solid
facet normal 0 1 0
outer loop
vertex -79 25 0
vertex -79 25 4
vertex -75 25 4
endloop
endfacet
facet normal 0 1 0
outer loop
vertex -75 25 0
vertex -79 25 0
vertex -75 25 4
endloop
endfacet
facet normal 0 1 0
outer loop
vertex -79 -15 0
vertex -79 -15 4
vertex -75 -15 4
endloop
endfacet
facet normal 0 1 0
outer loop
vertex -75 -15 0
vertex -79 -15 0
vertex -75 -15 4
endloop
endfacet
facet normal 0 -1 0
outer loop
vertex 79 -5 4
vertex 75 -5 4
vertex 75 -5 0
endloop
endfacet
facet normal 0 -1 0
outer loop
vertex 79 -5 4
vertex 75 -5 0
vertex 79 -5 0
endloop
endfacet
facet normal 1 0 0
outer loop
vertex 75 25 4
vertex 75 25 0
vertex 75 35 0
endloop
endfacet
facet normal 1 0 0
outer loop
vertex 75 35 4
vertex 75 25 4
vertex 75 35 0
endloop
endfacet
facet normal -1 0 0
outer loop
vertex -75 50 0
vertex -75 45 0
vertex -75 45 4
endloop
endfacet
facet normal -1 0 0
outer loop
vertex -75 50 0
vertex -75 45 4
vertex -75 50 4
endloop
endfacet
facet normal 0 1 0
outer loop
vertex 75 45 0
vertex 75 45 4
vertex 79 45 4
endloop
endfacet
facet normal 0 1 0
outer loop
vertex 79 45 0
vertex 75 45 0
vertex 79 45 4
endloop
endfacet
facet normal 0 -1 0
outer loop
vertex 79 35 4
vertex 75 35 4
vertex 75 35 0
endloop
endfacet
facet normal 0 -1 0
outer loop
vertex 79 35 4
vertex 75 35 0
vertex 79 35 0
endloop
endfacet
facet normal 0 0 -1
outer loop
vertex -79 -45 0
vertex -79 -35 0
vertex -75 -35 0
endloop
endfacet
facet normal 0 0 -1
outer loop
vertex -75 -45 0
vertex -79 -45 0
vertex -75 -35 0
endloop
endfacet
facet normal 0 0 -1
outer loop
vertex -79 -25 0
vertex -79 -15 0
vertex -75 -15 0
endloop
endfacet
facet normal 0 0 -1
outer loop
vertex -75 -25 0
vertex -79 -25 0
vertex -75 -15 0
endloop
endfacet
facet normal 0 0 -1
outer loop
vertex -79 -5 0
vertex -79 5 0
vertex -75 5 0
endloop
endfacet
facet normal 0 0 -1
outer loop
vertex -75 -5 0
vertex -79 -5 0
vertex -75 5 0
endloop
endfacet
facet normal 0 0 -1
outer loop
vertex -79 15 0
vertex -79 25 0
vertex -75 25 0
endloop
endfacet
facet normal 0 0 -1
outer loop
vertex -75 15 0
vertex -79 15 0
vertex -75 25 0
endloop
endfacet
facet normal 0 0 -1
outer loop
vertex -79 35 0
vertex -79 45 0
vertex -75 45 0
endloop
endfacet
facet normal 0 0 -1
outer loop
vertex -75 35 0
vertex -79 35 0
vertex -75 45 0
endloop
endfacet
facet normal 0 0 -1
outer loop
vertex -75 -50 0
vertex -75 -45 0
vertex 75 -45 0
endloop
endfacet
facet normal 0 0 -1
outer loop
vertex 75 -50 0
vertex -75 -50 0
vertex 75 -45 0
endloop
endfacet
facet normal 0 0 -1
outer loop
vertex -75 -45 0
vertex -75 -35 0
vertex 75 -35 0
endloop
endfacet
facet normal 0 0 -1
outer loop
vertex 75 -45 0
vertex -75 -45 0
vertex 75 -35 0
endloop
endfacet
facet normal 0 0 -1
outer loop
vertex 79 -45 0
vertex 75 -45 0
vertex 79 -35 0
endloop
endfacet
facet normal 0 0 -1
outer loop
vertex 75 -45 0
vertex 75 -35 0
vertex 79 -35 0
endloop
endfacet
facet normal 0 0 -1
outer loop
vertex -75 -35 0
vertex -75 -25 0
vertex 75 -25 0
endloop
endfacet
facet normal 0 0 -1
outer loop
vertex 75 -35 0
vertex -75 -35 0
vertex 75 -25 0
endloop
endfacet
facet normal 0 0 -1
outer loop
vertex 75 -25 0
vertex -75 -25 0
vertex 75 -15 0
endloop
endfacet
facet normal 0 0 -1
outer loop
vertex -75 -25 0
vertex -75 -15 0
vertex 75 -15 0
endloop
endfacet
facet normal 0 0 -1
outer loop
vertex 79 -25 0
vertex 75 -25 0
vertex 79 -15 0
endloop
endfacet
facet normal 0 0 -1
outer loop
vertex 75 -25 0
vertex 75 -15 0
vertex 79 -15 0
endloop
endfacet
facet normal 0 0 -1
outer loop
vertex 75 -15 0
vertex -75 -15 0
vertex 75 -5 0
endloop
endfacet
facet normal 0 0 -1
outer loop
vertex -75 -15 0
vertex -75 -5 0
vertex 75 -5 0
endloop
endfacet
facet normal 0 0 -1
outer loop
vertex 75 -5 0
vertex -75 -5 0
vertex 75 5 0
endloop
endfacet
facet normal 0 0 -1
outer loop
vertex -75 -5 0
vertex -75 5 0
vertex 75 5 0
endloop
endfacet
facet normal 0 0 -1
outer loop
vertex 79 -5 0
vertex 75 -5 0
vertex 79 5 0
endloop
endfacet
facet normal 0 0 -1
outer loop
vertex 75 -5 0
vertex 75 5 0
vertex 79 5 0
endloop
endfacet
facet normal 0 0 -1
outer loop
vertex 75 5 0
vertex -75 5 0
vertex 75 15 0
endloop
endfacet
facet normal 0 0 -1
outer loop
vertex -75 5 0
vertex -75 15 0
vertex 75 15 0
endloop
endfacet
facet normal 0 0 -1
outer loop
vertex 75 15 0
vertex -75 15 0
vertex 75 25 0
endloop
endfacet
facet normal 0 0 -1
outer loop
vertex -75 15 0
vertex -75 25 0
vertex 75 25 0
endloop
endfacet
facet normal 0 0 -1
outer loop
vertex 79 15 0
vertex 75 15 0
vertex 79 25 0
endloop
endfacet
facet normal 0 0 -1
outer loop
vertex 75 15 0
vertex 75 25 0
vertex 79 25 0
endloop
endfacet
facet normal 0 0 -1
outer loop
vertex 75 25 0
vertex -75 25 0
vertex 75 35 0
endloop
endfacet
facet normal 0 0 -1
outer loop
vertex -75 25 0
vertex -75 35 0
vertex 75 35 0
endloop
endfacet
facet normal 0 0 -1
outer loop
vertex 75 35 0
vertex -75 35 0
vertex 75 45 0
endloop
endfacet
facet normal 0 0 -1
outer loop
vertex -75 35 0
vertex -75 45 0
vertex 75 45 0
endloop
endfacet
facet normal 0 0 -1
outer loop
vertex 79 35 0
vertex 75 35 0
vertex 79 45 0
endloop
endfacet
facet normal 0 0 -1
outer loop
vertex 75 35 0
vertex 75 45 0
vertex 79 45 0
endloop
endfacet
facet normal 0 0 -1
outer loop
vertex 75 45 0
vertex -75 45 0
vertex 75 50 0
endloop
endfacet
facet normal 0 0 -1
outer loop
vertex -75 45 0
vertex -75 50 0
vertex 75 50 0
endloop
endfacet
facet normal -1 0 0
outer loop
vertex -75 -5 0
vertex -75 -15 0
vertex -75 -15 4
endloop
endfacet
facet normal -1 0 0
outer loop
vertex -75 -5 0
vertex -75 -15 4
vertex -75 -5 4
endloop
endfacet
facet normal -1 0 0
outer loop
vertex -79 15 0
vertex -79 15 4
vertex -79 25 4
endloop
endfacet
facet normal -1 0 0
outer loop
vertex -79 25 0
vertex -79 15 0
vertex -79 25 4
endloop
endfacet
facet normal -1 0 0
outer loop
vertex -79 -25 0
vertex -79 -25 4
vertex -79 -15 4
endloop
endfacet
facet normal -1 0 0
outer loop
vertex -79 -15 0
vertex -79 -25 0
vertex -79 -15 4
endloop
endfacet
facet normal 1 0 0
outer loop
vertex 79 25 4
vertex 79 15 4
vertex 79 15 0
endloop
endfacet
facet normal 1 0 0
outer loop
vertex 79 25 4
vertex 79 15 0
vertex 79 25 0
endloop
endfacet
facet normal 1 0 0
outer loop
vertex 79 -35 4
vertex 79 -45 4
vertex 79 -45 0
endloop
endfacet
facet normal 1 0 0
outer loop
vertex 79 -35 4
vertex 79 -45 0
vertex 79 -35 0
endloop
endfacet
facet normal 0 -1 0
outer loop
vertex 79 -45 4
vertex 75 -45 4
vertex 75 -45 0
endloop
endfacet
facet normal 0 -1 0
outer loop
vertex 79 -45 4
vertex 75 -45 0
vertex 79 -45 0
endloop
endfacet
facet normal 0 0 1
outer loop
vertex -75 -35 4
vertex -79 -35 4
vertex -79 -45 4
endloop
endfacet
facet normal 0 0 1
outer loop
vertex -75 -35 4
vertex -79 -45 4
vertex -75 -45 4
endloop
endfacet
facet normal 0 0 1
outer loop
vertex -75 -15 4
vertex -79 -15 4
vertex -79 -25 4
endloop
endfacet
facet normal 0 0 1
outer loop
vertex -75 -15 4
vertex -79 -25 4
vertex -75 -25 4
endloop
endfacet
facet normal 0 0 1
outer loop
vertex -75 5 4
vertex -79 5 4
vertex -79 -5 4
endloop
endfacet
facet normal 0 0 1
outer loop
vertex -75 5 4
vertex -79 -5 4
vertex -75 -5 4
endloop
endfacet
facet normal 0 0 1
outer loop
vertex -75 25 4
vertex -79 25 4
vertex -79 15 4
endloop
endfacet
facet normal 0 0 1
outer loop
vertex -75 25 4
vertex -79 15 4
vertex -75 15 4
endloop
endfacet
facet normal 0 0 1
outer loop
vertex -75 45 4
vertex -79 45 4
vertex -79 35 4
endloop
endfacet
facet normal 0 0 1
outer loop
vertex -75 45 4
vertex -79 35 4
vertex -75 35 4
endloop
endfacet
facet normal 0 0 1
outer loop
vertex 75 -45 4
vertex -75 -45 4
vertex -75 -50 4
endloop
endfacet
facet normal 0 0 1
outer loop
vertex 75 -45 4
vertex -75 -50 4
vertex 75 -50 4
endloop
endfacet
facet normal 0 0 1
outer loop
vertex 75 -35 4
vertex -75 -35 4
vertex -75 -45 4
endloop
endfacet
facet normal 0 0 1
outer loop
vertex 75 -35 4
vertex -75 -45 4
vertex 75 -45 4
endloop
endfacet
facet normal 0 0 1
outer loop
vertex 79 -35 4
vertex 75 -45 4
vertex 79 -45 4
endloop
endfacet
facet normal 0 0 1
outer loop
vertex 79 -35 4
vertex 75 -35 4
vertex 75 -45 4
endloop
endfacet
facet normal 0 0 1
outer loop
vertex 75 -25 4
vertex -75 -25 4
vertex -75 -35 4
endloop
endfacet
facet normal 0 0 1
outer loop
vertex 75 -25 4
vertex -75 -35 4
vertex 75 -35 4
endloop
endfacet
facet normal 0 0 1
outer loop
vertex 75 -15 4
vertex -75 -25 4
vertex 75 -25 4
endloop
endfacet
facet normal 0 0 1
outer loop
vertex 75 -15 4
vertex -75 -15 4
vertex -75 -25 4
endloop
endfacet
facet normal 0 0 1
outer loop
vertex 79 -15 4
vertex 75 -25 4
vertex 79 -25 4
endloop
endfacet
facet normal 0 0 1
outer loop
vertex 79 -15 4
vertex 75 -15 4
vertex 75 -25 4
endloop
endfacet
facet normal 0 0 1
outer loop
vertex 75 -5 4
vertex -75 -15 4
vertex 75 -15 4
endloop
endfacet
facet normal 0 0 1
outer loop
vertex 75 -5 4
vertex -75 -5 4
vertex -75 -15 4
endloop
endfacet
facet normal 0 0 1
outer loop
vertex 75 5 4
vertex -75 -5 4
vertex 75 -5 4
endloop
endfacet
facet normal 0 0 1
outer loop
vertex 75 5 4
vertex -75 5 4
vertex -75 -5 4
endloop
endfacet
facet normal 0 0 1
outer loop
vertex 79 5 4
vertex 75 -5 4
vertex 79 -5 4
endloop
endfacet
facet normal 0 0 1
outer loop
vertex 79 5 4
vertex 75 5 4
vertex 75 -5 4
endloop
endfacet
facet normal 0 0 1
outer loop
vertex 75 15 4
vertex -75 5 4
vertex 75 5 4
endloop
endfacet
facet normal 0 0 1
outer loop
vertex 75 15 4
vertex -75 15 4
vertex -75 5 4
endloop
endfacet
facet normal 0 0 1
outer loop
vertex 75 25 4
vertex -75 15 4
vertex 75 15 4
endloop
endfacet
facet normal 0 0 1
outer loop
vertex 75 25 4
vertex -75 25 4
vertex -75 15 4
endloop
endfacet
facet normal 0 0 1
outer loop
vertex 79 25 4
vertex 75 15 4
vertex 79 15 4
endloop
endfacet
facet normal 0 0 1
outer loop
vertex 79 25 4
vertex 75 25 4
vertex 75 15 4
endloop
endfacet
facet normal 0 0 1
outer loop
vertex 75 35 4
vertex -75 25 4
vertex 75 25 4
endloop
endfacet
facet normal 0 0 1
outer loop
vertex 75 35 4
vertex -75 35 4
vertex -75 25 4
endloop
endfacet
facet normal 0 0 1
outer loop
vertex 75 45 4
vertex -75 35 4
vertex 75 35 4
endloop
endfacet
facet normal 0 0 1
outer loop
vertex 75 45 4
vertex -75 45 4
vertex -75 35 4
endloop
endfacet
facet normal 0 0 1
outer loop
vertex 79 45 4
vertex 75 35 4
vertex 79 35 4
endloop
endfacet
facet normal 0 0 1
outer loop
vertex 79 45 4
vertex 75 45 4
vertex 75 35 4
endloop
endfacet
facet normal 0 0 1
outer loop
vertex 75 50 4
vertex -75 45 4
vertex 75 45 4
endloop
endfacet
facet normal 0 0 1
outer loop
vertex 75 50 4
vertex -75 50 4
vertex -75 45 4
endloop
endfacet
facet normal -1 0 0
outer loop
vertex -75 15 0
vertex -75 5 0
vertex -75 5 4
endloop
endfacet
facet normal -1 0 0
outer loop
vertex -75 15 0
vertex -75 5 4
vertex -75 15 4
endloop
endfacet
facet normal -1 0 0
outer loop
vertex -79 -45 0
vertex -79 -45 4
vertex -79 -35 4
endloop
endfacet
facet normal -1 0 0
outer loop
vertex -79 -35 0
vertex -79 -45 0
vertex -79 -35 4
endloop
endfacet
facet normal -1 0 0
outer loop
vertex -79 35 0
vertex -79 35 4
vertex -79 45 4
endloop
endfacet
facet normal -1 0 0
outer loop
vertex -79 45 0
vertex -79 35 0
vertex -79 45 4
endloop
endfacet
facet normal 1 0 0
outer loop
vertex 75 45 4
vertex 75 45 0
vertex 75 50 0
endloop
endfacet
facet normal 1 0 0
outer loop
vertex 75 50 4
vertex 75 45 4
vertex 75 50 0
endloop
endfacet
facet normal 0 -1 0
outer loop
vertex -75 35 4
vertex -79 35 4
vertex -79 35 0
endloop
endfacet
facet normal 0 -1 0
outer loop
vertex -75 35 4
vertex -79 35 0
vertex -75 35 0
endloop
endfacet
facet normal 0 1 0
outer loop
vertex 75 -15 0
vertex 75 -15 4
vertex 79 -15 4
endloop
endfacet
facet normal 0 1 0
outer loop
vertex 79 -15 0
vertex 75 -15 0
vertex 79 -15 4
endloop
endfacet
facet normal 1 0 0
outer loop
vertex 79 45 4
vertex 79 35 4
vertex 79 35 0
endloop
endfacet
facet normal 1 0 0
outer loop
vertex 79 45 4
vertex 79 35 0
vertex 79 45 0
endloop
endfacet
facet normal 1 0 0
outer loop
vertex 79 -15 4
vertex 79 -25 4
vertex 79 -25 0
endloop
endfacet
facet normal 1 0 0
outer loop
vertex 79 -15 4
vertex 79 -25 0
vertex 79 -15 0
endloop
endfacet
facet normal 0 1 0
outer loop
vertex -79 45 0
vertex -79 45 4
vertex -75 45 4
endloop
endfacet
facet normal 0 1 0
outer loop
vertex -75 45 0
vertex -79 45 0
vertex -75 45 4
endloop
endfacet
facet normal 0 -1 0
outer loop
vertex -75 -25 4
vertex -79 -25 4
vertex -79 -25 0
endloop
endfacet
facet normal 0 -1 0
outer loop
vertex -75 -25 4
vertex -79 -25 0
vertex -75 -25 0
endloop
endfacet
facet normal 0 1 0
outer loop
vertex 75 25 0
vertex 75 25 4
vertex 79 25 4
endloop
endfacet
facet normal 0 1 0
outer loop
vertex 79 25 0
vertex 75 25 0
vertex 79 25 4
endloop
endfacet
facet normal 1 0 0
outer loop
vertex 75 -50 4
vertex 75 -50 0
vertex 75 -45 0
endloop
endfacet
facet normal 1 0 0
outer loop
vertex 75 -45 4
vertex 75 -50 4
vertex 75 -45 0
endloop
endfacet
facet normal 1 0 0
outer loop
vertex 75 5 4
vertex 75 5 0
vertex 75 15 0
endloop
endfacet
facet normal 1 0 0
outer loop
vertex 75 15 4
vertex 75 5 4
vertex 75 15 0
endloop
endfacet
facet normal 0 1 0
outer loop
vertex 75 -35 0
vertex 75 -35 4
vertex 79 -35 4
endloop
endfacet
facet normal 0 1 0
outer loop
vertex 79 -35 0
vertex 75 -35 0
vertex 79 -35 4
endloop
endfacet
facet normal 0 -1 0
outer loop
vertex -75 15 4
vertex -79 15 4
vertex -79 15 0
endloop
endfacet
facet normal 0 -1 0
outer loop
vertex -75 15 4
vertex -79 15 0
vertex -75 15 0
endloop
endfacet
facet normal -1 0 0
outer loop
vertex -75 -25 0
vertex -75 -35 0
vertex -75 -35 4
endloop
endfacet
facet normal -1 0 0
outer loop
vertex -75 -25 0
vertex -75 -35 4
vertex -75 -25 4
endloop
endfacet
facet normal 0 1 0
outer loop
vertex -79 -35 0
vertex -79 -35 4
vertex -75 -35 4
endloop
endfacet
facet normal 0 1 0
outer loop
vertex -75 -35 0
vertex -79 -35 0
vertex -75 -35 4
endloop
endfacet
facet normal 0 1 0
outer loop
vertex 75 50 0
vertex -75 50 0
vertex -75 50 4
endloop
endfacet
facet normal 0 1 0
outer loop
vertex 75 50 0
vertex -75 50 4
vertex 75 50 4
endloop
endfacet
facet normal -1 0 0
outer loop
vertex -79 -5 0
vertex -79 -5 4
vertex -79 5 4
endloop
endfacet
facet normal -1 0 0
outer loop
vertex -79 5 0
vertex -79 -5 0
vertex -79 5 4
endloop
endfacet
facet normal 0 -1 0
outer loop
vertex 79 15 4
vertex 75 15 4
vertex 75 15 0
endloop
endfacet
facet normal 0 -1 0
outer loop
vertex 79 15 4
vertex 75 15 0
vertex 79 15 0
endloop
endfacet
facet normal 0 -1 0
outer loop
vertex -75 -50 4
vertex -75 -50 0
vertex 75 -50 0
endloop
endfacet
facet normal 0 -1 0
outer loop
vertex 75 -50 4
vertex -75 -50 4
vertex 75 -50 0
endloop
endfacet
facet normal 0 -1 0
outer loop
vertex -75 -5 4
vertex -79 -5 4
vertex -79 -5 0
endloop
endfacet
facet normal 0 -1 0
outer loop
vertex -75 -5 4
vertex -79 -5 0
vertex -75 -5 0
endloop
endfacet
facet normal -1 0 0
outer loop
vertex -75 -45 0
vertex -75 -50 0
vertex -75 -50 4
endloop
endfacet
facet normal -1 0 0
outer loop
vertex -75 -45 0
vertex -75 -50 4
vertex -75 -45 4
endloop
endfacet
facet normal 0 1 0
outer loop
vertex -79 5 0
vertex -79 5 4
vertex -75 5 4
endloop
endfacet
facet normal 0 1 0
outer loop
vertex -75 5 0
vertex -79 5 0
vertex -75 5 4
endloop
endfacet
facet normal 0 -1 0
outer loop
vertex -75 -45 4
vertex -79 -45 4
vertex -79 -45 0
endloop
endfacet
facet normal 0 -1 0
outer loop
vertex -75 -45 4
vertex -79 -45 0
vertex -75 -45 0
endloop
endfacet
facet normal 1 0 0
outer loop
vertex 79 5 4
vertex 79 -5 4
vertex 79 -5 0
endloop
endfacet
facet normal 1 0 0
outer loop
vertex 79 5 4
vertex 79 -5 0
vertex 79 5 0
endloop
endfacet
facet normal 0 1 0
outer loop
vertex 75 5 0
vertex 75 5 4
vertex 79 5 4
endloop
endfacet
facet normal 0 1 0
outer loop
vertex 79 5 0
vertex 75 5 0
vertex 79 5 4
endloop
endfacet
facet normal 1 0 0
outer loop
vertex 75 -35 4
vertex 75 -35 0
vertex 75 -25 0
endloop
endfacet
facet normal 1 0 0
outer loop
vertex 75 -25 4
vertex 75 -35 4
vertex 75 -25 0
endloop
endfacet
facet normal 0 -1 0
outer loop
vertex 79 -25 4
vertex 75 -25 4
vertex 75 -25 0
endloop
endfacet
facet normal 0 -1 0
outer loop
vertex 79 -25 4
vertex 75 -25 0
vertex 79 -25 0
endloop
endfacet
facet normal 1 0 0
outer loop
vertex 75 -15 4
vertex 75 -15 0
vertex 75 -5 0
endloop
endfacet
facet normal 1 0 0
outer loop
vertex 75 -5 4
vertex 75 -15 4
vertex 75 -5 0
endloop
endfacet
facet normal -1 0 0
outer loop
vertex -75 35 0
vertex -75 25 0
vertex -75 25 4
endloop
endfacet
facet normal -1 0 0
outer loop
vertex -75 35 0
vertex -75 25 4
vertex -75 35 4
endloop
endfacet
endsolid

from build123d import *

# Parameters (mm, degrees)
F0_W     = 150
F0_H     = 100
F1_DEPTH = 4
F2_W     = 4
F2_H     = 10
F3_DEPTH = 4


with BuildPart() as f1:
    # F0 (on Top) → F1 (new body)
    with BuildSketch(Plane.XY):
        Rectangle(F0_W, F0_H)
    extrude(amount=F1_DEPTH)

    # F2 (on face) → F3 (join)
    with BuildSketch(Plane.XY.offset(4)):
        with Locations((-77, -40)):
            Rectangle(F2_W, F2_H)
        with Locations((-77, -20)):
            Rectangle(F2_W, F2_H)
        with Locations((-77, 0)):
            Rectangle(F2_W, F2_H)
        with Locations((-77, 20)):
            Rectangle(F2_W, F2_H)
        with Locations((-77, 40)):
            Rectangle(F2_W, F2_H)
        with Locations((77, -40)):
            Rectangle(F2_W, F2_H)
        with Locations((77, -20)):
            Rectangle(F2_W, F2_H)
        with Locations((77, 0)):
            Rectangle(F2_W, F2_H)
        with Locations((77, 40)):
            Rectangle(F2_W, F2_H)
        with Locations((77, 20)):
            Rectangle(F2_W, F2_H)
    extrude(amount=-F3_DEPTH)


solid = f1.part
